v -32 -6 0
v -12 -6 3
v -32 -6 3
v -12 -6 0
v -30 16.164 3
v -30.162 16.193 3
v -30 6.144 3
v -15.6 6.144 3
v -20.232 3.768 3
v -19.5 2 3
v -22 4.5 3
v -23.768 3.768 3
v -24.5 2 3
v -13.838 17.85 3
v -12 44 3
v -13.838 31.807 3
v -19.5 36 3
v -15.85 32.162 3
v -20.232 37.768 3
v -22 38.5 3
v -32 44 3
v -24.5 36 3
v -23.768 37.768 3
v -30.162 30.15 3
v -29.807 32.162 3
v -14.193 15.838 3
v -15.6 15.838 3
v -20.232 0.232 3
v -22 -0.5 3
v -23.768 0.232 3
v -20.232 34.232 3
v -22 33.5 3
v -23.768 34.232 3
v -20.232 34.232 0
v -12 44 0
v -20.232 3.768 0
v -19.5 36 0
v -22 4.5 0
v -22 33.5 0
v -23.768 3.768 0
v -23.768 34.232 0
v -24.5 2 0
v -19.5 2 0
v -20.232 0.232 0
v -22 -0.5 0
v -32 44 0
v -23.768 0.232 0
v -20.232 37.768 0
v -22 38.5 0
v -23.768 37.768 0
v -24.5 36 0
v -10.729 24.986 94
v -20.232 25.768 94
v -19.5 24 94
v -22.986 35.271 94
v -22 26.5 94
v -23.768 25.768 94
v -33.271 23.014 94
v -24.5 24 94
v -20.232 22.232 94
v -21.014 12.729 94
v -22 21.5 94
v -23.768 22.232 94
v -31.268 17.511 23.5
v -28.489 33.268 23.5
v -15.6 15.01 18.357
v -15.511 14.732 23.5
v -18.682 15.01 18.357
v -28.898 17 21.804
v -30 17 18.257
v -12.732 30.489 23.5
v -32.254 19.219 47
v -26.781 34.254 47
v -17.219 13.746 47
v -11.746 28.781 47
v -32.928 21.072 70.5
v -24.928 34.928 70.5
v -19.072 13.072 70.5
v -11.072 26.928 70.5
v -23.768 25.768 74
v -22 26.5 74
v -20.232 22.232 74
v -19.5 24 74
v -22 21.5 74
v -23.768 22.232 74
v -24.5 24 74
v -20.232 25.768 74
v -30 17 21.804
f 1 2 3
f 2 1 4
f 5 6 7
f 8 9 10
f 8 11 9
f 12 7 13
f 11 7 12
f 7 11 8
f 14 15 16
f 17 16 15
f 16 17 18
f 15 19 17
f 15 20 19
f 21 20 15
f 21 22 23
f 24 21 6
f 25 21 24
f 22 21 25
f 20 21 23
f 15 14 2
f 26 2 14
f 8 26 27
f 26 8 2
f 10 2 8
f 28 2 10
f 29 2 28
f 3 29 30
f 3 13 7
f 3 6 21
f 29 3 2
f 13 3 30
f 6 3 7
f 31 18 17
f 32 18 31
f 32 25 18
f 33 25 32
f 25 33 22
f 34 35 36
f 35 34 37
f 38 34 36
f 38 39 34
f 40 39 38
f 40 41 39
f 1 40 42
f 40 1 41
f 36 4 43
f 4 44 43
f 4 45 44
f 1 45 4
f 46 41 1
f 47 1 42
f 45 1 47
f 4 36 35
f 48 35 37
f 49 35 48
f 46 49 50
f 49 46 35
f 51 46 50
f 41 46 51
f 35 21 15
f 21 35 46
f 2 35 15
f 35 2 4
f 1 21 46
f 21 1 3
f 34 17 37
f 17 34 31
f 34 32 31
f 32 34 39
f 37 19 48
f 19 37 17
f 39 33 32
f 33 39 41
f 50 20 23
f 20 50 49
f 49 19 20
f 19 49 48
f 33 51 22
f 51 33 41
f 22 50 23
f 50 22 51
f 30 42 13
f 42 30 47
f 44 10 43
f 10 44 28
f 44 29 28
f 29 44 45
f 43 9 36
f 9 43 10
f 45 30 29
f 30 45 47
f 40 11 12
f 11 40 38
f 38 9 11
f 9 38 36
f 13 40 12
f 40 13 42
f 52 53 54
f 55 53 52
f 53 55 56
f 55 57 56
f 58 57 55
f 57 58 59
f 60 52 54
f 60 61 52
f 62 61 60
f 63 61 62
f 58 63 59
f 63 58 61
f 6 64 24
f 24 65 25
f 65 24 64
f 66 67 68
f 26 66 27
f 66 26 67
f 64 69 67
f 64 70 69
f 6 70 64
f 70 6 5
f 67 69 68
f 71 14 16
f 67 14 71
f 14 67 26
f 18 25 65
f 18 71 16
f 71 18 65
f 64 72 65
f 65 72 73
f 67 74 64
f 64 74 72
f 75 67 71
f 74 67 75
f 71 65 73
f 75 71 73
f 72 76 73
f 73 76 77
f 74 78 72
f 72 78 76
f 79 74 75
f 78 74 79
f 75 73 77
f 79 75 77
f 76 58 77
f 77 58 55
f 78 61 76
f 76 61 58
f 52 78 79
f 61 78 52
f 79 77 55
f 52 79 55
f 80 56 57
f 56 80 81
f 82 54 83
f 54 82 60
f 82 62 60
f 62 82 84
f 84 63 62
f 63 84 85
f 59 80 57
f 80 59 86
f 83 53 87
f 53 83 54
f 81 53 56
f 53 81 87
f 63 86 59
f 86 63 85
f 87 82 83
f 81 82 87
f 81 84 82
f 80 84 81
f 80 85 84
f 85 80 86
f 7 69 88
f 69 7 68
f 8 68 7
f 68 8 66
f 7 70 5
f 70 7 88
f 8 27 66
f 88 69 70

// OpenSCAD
// file: ../lib/lego.scad
//narrow_brick(height=3);

plate([2,3], hollow=false);

// NOTE: The bricks described here are not perfectly fit to the tolerances of a
//             consumer injection-molded peg-and-socket brick. They snap tight to
//             one another, but not all that well to the consumer-grade bricks.

// src: https://bricks.stackexchange.com/questions/288/what-are-the-dimensions-of-a-lego-brick

lego = 1.6;

wall = lego * .95; // * 1.0
toler = 1;

stud_diam = 3 * lego + .5 * toler; // .2
stud_inner = 2 * lego + .5 * toler; // .2
stud_height = 1 * lego;

duct_diam = 5 * sqrt(2) - 3 + 2.5 * toler;
duct_inner = duct_diam - wall - .2*toler; // 0

brick_one = 5 * lego;
inner_one = brick_one - (wall*2);

//
// API modules
///
function lego_unit() = lego;

function brick_unit() = brick_one;

function brick_height() = 6;

function plate_height() = 2;

module plate(grid=[3,2], pegs=true, hollow=true, posts=true) {
    brick(grid, plate_height(), pegs, hollow, posts);
}

module brick(grid=[2,1], height=brick_height(), pegs=true, hollow=true, posts=true) {
    if (grid[0] < grid[1]) translate([0, grid[0]*brick_one, 0]) rotate([0,0,-90]) brick([grid[1], grid[0]], height, pegs, hollow, posts);
    else {
        if (grid[1] > 1) wide_brick(grid, height, pegs, hollow);
        else narrow_brick(grid[0], height, pegs, hollow, posts);
        }
}

//
// Subroutine modules
//
module wide_brick(grid, height, pegs, hollow) {
    union() {
        brick_sans_posts(grid, height, pegs, hollow);
        difference() {
            for (col = [1 : grid[1]-1]) for(row = [1:grid[0]-1]) color([0,1,1]) translate([brick_one*col,brick_one*row,0]) cylinder(d=duct_diam, lego*height-wall/2);
            for (col = [1 : grid[1]-1]) for(row = [1:grid[0]-1]) color([1,1,1]) translate([brick_one*col,brick_one*row,0]) cylinder(d=duct_inner, lego*height-wall/2);
            }
    }
}

module narrow_brick(length, height, pegs, hollow, posts) {
    union() {
        brick_sans_posts([length, 1], height, pegs, hollow);
        if (posts && length>1) for (spot = [1 : length-1]) color([0,1,0]) translate([brick_one/2,brick_one*spot,0]) cylinder(d=stud_inner, lego*height);
        }
}

module brick_sans_posts(grid, height, pegs, hollow) {
    difference() {
        brick_sans_hollow(grid, height, pegs);
        color([0,0,1]) translate([wall,wall,0]) cube([inner_one+(grid[1]-1)*brick_one, inner_one+(grid[0]-1)*brick_one, lego*height - wall+toler/2]);
        if (pegs && hollow) for (col = [1 : grid[1]]) for(row = [1:grid[0]]) color([1,1,0]) translate([brick_one*(col-.5),brick_one*(row-.5),lego*height-wall*2]) cylinder(d=stud_inner, stud_height+wall*2);
        }
}

module brick_sans_hollow(grid, height, pegs) {
    union() {
        cube([brick_one*grid[1], brick_one*grid[0], lego*height]);
        if (pegs) for (col = [1 : grid[1]]) for(row = [1:grid[0]]) color([1,0,0]) translate([brick_one*(col-.5),brick_one*(row-.5),lego*height]) cylinder(d=stud_diam, stud_height);
        }
}
// main file
use <../lib/lego.scad>;

drill=5;
depth=20;
hole=8;
width=2*brick_unit();
length=3*width;
post = 94;

difference() {
//    base();
    rotate([0,0,-90]) translate([-32,-30,0]) post();
//    translate([0,0,5*lego_unit()]) cube([100,100,100]);
}





module base() {
    difference() {
         restraint();
         translate([2*brick_unit(), 3*brick_unit(), -1]) cylinder(d=drill, 2*depth);
    }
}

module post() {
    span=40;
    breadth=20;
    overhang=10;
    winnow=.2*brick_unit();

    translate([-(span-width)/2,-(breadth-width)/2,0]) {
        difference() {
            cube([span+overhang,breadth,3]);
            translate([hole, breadth/2, 0]) cylinder(d=drill, depth);
            translate([span-hole+overhang, breadth/2, 0]) cylinder(d=drill, depth);
        }
    }

    translate([brick_unit(),brick_unit(),0]) {
        difference() {
            linear_extrude(post,twist=40) translate([-brick_unit(), -brick_unit(), 0]) square([2*brick_unit(),2*brick_unit()]);
            translate([0,0,post-depth]) color([0,0,1]) cylinder(d=drill, depth);
        }
    }

    difference() {
        color([0,1,1]) translate([overhang*1.2, 0,-overhang/2]) rotate([0,-30,0]) cube([2*brick_unit(),2*brick_unit()-winnow,2.5*overhang]);
        color([1,1,0]) translate([-overhang*.1,0,0]) cube([2*brick_unit(),2*brick_unit()-winnow,2.5*overhang]);
        color([1,0,1]) translate([overhang*.5,0,-overhang]) cube([2*brick_unit(),2*brick_unit()-winnow,overhang]);
    }
}

cord = 3.5;

module restraint() {
    difference() {
        color([.25,0,.75]) translate([-cord/4,0,0]) riser([.5,2.5,0],[1,1],4);
        color([.75,0,.25]) translate([.5*brick_unit(),3*brick_unit()-cord/2,0]) cube([cord,cord,4*lego_unit()]);
        color([.75,0,.5]) translate([0*brick_unit(),3*brick_unit()-cord/2+cord/32,0]) cube([cord*2,cord-cord/16,4*lego_unit()]);    }
    
    difference() {
        color([.3,.3,0]) plank([1,0,-2], [6,6]);

        color([0,.5,.5]) translate([brick_unit(),2*brick_unit(),-2*lego_unit()]) cube([2*brick_unit(),2*brick_unit(),3]);
        color([.0,0,.75]) translate([brick_unit(),1.75*brick_unit(),-2*lego_unit()]) cube([.5*brick_unit(),2.5*brick_unit(),3]);
        color([.0,0,.75]) translate([2.5*brick_unit(),1.75*brick_unit(),-2*lego_unit()]) cube([.5*brick_unit(),2.5*brick_unit(),3]);
       color([.0,.75,0]) translate([brick_unit(),2*brick_unit(),-2*lego_unit()]) cube([2.25*brick_unit(),0.5*brick_unit(),3]);
       color([.0,.75,0]) translate([brick_unit(),3.5*brick_unit(),-2*lego_unit()]) cube([2.25*brick_unit(),0.5*brick_unit(),3]);

        color([0,0,.5]) translate([4.5*brick_unit(),2.5*brick_unit(),-2*lego_unit()]) cube([brick_unit(), brick_unit(), 3*lego_unit()]);
        
    }
    
    color([1,1,1]) plank([4,0,0], [2.4,3]);
    plank([4,3.6,0], [2.4,3]);

    color([0,1,1]) riser([6,0,0], [1,1],8);
    translate([5.9*brick_unit(),0,-2*lego_unit()]) rotate([0,-50,0]) color([0,1,.6]) riser([0,0,0], [1,1.6],6);
    translate([5.9*brick_unit(),5*brick_unit(),-2*lego_unit()]) rotate([0,-50,0]) color([0,1,.6]) riser([0,0,0], [1,1.6],6);
    riser([6,5,0], [1,1],8);

    color([1,0,0]) plank([1,0,2], [6,3.5]);
    plank([1,0,0], [6,3.5]);

    color([0,1,0]) riser([2,0,4], [2,1.75]);
    riser([2,4,4], [2,1.75]);

    riser([1,0,4], [1,2], 24);
    riser([1,5,4], [1,2], 24);

    color([1,0,0]) riser([2.25,0,22], [1,2]);
    color([1,0,0]) riser([2.25,5,22], [1,2]);

    riser([1,0,4],[2,1],18);
    riser([1,4,4],[2,1],18);
    
    riser([1,1,22],[1,1]);
    riser([1,4,22],[1,1]);

    color([1,0,1]) translate([1*brick_unit(), 3*brick_unit(), 20*lego_unit()]) rotate([-35,0,0]) cube([1*brick_unit(),2*brick_unit(),2*brick_unit()]);
    color([1,0,1]) translate([1*brick_unit(),3*brick_unit(), 20*lego_unit()]) rotate([125,0,0]) cube([1*brick_unit(),2*brick_unit(),2*brick_unit()]);
}        

module plank(pos=[0,0,0], dims=[1,1]) {
    translate([pos[0]*brick_unit(), pos[1]*brick_unit(), pos[2]*lego_unit()]) solid(dims, 2, false);
}

module riser(pos=[0,0,0], dims=[1,1], height=brick_height()) {
    translate([pos[0]*brick_unit(), pos[1]*brick_unit(), pos[2]*lego_unit()]) { //brick(dims, height, false);
           solid(dims, height, false);
    }
}

module solid(dims, height, pegs) {
    cube([dims[1]*brick_unit(), dims[0]*brick_unit(), height*lego_unit()]);
}
